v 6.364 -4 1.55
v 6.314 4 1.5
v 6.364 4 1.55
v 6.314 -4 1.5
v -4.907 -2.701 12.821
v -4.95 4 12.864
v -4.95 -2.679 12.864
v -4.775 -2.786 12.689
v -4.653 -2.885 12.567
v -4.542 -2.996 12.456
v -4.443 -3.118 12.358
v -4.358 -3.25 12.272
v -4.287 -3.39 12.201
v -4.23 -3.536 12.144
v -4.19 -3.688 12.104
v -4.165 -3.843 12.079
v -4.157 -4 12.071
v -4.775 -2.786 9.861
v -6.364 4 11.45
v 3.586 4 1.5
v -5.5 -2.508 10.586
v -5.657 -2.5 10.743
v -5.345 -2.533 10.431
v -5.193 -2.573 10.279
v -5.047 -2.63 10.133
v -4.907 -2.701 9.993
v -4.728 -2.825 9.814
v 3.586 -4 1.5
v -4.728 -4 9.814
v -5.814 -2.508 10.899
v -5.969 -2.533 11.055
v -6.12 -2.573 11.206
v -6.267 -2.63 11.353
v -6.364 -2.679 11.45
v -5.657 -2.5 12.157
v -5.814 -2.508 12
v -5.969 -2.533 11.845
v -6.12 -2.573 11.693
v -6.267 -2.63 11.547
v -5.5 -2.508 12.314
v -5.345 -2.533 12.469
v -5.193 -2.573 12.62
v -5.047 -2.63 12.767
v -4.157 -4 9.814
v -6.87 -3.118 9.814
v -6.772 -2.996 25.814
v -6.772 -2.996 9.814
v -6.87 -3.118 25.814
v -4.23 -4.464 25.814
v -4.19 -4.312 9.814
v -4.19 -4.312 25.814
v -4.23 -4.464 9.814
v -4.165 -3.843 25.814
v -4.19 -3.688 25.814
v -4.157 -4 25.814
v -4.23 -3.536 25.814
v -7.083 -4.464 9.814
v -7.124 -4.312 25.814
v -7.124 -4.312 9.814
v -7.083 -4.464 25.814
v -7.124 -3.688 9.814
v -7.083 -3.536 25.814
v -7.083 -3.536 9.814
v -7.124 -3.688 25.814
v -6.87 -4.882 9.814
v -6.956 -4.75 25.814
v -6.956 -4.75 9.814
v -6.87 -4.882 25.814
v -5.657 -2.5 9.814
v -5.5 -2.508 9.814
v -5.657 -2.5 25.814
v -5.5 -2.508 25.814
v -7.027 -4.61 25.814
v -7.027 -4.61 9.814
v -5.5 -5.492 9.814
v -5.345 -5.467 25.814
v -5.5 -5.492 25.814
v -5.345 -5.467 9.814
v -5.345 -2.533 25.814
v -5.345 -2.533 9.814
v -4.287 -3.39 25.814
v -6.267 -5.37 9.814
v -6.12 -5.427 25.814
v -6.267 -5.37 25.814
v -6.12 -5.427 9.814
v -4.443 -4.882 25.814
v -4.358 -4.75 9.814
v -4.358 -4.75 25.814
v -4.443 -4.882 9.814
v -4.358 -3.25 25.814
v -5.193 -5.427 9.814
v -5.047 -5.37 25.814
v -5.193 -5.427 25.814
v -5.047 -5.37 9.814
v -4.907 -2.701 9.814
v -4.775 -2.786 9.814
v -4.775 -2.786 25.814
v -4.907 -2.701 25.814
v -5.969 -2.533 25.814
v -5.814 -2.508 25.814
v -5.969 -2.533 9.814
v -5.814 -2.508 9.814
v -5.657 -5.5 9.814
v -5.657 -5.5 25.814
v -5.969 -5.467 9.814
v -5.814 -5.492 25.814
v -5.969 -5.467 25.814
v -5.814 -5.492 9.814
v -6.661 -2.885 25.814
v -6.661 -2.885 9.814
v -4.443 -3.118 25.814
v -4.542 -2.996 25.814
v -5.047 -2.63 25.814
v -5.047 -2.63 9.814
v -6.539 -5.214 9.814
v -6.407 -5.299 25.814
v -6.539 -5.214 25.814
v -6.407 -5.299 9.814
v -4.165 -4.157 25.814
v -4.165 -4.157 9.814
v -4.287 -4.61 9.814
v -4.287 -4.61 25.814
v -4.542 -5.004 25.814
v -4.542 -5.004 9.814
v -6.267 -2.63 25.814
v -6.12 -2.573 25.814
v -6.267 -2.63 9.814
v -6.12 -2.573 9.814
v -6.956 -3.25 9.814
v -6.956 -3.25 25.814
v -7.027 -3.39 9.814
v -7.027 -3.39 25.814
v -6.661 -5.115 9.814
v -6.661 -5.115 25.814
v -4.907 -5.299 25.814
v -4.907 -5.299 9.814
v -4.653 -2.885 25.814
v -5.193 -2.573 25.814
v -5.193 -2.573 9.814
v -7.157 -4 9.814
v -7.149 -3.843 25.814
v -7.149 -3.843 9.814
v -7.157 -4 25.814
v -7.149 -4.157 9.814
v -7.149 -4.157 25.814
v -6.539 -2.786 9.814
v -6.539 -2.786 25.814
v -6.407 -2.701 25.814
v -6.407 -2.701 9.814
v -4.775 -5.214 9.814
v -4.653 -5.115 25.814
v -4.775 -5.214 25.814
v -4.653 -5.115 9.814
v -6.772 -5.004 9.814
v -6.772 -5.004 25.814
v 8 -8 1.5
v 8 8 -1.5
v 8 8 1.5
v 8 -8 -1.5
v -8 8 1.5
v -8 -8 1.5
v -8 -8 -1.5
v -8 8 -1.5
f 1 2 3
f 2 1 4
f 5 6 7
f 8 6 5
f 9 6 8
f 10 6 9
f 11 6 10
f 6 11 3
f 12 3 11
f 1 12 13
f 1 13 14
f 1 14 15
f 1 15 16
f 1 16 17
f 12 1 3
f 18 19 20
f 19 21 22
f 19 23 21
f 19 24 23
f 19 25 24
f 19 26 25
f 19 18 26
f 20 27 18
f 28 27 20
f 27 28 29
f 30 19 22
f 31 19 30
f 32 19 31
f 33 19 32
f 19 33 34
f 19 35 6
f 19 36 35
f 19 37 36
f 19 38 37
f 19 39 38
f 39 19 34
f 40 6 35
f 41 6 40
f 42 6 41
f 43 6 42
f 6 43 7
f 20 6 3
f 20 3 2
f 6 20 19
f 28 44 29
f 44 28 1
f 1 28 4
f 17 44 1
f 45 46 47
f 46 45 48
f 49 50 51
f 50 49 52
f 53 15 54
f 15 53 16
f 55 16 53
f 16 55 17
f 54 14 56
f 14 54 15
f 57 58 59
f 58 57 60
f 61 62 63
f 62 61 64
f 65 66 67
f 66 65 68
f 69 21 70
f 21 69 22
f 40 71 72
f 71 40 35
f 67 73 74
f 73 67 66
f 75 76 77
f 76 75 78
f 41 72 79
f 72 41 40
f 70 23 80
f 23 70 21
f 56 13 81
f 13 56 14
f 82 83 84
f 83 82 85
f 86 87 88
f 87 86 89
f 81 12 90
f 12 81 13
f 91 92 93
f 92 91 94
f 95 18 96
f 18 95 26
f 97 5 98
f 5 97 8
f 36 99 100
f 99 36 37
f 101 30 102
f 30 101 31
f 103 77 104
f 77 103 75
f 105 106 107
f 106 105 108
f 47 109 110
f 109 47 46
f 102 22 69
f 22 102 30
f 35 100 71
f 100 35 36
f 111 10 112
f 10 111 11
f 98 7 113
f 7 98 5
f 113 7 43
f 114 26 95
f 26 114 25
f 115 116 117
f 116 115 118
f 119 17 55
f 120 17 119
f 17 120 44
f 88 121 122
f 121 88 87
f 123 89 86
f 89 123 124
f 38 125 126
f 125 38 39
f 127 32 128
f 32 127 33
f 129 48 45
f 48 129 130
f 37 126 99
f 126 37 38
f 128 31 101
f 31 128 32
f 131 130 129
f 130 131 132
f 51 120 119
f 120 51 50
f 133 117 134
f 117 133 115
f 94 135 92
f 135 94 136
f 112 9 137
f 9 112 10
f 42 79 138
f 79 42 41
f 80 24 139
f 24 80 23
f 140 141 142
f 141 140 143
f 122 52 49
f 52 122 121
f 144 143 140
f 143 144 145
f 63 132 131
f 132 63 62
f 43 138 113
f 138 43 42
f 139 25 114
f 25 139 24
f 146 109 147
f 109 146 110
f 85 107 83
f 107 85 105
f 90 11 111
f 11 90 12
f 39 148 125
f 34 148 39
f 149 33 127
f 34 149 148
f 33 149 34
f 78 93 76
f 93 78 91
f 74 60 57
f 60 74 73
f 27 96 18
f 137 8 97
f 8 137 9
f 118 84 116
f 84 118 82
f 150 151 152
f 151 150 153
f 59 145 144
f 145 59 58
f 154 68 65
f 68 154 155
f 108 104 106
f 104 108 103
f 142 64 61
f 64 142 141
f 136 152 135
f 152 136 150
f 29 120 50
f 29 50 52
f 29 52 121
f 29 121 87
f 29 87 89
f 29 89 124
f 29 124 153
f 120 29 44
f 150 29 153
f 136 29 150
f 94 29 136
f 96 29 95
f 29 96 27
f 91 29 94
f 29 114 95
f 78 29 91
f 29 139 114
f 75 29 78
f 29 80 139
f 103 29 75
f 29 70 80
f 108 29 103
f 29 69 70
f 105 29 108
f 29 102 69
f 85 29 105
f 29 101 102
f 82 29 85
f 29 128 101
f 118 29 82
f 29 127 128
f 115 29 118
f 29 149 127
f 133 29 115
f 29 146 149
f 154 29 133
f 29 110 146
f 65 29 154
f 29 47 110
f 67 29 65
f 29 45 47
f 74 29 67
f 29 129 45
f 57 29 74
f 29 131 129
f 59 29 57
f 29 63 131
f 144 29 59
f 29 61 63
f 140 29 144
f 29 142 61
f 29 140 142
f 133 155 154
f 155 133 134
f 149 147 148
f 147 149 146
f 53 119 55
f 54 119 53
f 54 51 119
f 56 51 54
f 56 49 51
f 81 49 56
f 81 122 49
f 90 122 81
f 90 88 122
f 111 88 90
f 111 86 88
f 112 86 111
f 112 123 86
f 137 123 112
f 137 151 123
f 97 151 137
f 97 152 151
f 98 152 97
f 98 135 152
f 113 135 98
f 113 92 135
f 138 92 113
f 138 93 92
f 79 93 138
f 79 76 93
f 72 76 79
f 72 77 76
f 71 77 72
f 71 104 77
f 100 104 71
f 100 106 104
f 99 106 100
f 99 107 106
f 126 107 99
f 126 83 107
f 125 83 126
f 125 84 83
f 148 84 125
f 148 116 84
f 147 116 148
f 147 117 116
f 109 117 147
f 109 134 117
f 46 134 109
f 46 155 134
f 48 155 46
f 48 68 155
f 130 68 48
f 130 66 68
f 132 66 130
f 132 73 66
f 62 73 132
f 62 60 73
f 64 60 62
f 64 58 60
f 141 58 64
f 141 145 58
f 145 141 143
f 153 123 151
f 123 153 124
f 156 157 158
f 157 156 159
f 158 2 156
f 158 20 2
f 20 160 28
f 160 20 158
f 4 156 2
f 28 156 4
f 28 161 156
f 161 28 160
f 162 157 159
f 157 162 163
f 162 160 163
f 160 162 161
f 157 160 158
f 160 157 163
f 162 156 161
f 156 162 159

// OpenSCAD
baseX = 16;
baseY = 16;
baseZ = 3;

phoneX = baseX;
phoneY = baseY/2;
phoneZ = 2;
phoneTilt = 45;

$fn = 60;

topAngle = 180-90-phoneTilt;
phoneHeight = phoneX * sin(phoneTilt)/sin(90);
phoneOffset = phoneX * sin(topAngle)/sin(90);

echo("Top Angle: ", topAngle);
echo("Phone Height: ", phoneHeight);
echo("Phone Offset: ", phoneOffset);


translate([0,0,(phoneX/2)-baseZ/2]) rotate([0,phoneTilt,0]) cube([phoneX, phoneY, phoneZ], center=true);

translate([-phoneOffset/2, -phoneY/2, phoneHeight-baseZ/2]) cylinder(r=1.5, h=phoneX);

cube([baseX, baseY, baseZ], center=true);
